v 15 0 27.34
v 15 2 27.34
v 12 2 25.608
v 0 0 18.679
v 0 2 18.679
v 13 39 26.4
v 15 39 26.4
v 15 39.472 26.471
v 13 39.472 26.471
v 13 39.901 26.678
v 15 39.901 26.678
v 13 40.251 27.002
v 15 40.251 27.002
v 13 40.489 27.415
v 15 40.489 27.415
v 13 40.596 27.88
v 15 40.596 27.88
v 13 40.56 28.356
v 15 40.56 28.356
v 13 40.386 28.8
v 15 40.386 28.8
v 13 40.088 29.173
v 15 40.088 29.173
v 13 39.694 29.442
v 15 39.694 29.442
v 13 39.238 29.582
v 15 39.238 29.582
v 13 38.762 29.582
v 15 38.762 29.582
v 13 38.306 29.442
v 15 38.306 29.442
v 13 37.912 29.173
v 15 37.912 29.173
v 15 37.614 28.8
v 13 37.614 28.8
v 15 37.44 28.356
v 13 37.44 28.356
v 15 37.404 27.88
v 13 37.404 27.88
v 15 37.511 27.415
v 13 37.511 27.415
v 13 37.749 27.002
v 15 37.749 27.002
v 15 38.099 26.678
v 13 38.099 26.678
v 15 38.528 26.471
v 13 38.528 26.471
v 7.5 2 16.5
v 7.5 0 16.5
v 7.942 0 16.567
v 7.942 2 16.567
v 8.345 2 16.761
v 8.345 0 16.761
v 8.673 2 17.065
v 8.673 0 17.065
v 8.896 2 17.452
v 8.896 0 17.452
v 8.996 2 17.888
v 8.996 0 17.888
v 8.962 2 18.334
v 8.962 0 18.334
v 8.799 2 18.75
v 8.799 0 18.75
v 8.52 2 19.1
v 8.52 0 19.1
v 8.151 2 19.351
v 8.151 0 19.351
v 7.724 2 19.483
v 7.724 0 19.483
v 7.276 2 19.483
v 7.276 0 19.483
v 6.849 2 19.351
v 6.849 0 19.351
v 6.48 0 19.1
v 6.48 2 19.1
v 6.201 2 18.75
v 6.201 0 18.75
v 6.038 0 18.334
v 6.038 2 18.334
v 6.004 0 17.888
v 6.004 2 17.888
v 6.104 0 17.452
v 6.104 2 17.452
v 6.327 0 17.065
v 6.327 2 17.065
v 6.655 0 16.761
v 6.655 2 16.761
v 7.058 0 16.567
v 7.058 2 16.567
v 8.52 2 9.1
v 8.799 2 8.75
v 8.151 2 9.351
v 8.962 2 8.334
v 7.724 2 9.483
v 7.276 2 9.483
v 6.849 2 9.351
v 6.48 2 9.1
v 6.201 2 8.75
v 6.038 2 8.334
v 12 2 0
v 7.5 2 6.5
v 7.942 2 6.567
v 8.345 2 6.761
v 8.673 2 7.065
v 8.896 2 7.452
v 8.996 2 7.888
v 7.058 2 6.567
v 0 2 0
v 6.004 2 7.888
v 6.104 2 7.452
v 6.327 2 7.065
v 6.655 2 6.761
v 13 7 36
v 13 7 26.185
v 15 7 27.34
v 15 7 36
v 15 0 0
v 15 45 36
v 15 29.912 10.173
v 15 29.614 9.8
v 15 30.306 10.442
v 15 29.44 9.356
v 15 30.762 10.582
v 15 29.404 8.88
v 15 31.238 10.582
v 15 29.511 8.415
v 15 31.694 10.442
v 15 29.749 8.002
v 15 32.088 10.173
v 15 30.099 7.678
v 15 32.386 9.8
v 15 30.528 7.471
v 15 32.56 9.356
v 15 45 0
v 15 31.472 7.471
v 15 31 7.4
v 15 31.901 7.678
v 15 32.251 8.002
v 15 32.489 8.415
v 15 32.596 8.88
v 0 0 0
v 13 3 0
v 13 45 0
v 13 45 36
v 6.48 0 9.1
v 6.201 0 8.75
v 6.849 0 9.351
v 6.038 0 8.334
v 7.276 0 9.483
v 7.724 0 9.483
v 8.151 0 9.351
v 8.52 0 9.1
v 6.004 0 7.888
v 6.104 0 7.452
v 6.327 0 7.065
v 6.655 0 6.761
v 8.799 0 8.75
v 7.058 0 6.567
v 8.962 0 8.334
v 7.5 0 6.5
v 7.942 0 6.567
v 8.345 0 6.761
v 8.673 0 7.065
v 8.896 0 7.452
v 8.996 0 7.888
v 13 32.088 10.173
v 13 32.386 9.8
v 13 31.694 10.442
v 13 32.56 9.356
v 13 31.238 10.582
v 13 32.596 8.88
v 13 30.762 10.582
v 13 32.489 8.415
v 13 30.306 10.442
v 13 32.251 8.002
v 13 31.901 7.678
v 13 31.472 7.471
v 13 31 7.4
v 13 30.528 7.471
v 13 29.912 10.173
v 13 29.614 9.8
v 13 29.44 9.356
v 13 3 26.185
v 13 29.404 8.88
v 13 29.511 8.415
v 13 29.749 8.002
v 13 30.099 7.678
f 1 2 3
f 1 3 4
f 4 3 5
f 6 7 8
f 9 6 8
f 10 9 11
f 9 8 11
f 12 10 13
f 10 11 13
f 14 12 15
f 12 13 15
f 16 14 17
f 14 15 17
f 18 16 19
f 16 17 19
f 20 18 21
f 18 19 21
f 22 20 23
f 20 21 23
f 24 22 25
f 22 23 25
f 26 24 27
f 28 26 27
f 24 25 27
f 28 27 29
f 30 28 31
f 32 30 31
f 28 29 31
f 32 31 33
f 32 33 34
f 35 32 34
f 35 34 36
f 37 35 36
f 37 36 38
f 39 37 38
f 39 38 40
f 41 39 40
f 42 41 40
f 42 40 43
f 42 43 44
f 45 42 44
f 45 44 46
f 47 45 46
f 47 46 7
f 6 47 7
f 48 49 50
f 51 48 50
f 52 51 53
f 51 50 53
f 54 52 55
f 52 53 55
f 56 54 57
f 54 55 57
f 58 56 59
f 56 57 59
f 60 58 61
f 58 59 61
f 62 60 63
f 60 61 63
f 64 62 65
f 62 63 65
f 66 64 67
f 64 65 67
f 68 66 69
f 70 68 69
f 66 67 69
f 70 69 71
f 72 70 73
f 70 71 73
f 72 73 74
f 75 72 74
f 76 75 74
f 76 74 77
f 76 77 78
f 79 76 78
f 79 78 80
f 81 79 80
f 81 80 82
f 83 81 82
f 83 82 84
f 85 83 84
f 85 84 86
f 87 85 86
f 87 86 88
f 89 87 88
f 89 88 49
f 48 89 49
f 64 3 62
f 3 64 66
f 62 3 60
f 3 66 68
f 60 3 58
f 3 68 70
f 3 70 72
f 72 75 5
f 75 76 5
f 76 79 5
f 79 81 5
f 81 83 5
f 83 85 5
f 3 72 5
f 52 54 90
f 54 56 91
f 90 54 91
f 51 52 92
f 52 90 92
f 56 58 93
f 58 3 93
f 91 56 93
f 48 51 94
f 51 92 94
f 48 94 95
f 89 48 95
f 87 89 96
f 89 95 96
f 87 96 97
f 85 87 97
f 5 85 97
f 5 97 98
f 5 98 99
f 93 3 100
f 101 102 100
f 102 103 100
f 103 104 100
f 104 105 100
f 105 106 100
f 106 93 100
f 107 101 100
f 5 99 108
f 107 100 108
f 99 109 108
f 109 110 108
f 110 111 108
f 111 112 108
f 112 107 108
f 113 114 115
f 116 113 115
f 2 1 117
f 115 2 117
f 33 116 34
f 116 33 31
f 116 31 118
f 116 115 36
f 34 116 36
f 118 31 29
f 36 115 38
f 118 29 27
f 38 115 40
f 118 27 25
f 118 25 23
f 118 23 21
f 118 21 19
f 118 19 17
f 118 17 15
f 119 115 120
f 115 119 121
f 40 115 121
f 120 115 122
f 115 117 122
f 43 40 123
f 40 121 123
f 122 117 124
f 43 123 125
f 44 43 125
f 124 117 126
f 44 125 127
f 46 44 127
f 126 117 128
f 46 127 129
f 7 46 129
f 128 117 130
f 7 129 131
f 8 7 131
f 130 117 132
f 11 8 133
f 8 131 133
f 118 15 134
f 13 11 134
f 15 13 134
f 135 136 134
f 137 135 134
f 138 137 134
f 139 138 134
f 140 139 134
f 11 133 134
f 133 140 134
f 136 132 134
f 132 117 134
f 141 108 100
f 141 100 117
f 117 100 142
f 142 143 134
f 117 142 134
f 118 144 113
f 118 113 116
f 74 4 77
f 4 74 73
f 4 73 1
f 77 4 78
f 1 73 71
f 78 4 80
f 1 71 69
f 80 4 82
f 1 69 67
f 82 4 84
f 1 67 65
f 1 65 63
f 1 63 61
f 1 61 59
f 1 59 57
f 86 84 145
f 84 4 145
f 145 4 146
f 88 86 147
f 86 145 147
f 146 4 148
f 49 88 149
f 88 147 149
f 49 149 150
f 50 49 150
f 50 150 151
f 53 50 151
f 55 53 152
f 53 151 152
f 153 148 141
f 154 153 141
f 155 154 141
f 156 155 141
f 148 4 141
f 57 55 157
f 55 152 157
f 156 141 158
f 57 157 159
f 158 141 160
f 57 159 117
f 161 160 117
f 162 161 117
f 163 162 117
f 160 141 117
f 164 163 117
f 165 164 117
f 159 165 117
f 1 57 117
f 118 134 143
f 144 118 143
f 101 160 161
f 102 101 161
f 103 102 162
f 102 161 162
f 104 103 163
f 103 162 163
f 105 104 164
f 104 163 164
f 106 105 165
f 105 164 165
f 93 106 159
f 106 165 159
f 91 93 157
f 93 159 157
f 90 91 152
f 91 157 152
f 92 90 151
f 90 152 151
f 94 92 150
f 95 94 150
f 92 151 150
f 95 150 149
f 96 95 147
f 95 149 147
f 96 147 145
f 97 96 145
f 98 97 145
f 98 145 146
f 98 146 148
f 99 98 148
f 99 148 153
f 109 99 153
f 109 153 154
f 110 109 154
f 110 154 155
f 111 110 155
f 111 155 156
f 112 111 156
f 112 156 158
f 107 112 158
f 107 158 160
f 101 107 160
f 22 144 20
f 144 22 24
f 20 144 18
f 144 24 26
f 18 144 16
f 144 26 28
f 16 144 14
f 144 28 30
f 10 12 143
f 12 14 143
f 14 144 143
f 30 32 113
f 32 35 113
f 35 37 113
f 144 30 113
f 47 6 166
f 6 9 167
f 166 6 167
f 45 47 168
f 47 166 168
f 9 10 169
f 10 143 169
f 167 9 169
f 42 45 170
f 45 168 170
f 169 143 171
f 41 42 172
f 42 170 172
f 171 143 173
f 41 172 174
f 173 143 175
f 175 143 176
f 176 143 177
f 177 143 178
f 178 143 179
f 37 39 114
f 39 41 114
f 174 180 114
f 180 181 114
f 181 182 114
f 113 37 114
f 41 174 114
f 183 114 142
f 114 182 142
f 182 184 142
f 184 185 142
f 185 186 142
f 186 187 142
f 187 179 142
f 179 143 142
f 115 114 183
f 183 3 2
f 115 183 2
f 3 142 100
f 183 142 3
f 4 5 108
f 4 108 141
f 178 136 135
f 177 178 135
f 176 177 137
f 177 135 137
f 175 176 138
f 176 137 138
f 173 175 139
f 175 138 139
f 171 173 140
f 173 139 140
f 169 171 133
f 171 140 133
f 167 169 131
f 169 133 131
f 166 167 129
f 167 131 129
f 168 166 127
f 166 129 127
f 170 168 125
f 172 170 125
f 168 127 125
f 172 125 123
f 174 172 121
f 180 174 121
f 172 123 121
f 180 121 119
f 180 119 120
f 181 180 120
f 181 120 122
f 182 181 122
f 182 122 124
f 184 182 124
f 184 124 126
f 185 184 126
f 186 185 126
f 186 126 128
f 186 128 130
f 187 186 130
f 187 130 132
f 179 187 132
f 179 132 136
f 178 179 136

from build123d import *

# Parameters (mm, degrees)
EXTRUDE_2_DEPTH     = 36
CUT_EXTRUDE_4_REACH = 61.548
SKETCH_7_R          = 1.5
CHAMFER_2_SIZE      = 1
CUT_EXTRUDE_5_REACH = 61.548
SKETCH_8_R          = 1.6
CUT_EXTRUDE_6_REACH = 60.052
CUT_EXTRUDE_8_DEPTH = 5


with BuildPart() as part:
    # ｽｹｯﾁ6 → ﾎﾞｽ - 押し出し2 (new body)
    with BuildSketch(Plane.XY):
        Polygon((0, 0), (15, 0), (15, 45), (13, 45), (13, 2), (0, 2), align=None)
    extrude(amount=EXTRUDE_2_DEPTH)

    # ｽｹｯﾁ7 → ｶｯﾄ - 押し出し4 (cut, up to next)
    with BuildSketch(Plane.XZ, mode=Mode.PRIVATE) as cut_extrude_4_sk1:
        with Locations(Location((7.5, 18, 0), (0, 0, 270))):
            Circle(SKETCH_7_R)
    cut_extrude_4_tool1 = extrude(cut_extrude_4_sk1.sketch, amount=-CUT_EXTRUDE_4_REACH, mode=Mode.PRIVATE) & part.part
    # ｽｹｯﾁ7 → ｶｯﾄ - 押し出し4 (cut, up to next)
    with BuildSketch(Plane.XZ, mode=Mode.PRIVATE) as cut_extrude_4_sk2:
        with Locations(Location((7.5, 8, 0), (0, 0, 270))):
            Circle(SKETCH_7_R)
    cut_extrude_4_tool2 = extrude(cut_extrude_4_sk2.sketch, amount=-CUT_EXTRUDE_4_REACH, mode=Mode.PRIVATE) & part.part
    add(cut_extrude_4_tool1.solids().sort_by_distance((7.5, 0, 18))[0], mode=Mode.SUBTRACT)
    add(cut_extrude_4_tool2.solids().sort_by_distance((7.5, 0, 8))[0], mode=Mode.SUBTRACT)

    # 面取り2
    chamfer_2_edges = [part.edges().sort_by_distance(p)[0] for p in [
        (13, 2, 18),
    ]]
    chamfer(chamfer_2_edges, length=CHAMFER_2_SIZE)

    # ｽｹｯﾁ8 → ｶｯﾄ - 押し出し5 (cut, up to next)
    with BuildSketch(Plane(origin=(15, 0, 0), x_dir=(0, 0, -1), z_dir=(1, 0, 0)), mode=Mode.PRIVATE) as cut_extrude_5_sk1:
        with Locations((-28, 39)):
            Circle(SKETCH_8_R)
    cut_extrude_5_tool1 = extrude(cut_extrude_5_sk1.sketch, amount=-CUT_EXTRUDE_5_REACH, mode=Mode.PRIVATE) & part.part
    # ｽｹｯﾁ8 → ｶｯﾄ - 押し出し5 (cut, up to next)
    with BuildSketch(Plane(origin=(15, 0, 0), x_dir=(0, 0, -1), z_dir=(1, 0, 0)), mode=Mode.PRIVATE) as cut_extrude_5_sk2:
        with Locations((-9, 31)):
            Circle(SKETCH_8_R)
    cut_extrude_5_tool2 = extrude(cut_extrude_5_sk2.sketch, amount=-CUT_EXTRUDE_5_REACH, mode=Mode.PRIVATE) & part.part
    add(cut_extrude_5_tool1.solids().sort_by_distance((15, 39, 28))[0], mode=Mode.SUBTRACT)
    add(cut_extrude_5_tool2.solids().sort_by_distance((15, 31, 9))[0], mode=Mode.SUBTRACT)

    # ｽｹｯﾁ9 → ｶｯﾄ - 押し出し6 (cut, up to next)
    with BuildSketch(Plane(origin=(0, 2, 0), x_dir=(1, 0, 0), z_dir=(0, 1, 0)), mode=Mode.PRIVATE) as cut_extrude_6_sk1:
        Polygon((0, -36), (30, -36), (0, -18.679491924), align=None)
    cut_extrude_6_tool1 = extrude(cut_extrude_6_sk1.sketch, amount=-CUT_EXTRUDE_6_REACH, mode=Mode.PRIVATE) & part.part
    add(cut_extrude_6_tool1.solids().sort_by_distance((10, 2, 30.226497))[0], mode=Mode.SUBTRACT)

    # ｽｹｯﾁ11 → ｶｯﾄ - 押し出し8 (cut)
    with BuildSketch(Plane.XZ.offset(-2)):
        Polygon((12, 25.607695155), (15, 27.339745962), (15, 36), (12, 36), align=None)
    extrude(amount=-CUT_EXTRUDE_8_DEPTH, mode=Mode.SUBTRACT)


solid = part.part
